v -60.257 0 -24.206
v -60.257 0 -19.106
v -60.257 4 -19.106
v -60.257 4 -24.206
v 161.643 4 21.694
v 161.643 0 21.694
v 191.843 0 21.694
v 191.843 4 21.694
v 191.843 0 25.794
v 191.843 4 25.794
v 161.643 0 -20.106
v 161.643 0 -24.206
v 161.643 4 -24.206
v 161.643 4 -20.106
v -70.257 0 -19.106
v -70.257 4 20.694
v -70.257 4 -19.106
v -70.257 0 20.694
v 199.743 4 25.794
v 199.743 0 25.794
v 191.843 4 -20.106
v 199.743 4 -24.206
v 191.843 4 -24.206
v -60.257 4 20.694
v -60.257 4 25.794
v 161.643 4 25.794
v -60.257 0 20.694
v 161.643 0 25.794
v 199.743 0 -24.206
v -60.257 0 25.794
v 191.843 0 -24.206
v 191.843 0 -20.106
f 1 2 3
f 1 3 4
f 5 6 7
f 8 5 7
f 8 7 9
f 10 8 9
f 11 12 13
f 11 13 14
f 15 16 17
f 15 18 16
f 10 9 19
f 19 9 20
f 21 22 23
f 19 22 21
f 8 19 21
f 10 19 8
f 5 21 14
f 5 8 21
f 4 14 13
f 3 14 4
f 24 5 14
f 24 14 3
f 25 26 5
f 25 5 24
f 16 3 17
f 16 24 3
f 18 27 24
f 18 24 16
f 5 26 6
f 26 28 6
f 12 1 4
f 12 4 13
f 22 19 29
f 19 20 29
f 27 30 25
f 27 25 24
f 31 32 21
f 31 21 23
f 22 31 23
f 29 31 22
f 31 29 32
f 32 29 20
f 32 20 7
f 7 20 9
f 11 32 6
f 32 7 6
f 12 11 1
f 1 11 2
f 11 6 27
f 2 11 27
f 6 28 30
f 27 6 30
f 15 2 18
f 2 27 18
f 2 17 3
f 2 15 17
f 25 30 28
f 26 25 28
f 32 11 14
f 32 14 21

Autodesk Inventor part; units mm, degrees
ref_plane "YZ Plane" through (0, 0, 0) normal (1, 0, 0) x (0, 1, 0)
ref_plane "XZ Plane" through (0, 0, 0) normal (0, 1, 0) x (-1, 0, 0)
ref_plane "XY Plane" through (0, 0, 0) normal (0, 0, 1) x (1, 0, 0)
sketch "스케치1" plane through (0, 0, 0) normal (0, 1, 0) x (-1, 0, 0)
  line L0 (-199.7433, 25.7945) -> (-199.7433, -24.2055)
  line L1 (-149.7433, 25.7945) -> (-149.7433, -24.2055) construction
  line L2 (-161.6433, 25.7945) -> (-161.6433, 21.6945)
  line L3 (-161.6433, 21.6945) -> (-191.8433, 21.6945)
  line L4 (-191.8433, 21.6945) -> (-191.8433, 25.7945)
  line L5 (-153.7433, 25.7945) -> (-153.7433, -24.2055) construction
  line L6 (-161.6433, -24.2055) -> (-161.6433, -20.1055)
  line L7 (-161.6433, -20.1055) -> (-191.8433, -20.1055)
  line L8 (-191.8433, -20.1055) -> (-191.8433, -24.2055)
  line L9 (60.2567, 25.7945) -> (60.2567, 20.6945)
  line L10 (60.2567, 20.6945) -> (70.2567, 20.6945)
  line L11 (70.2567, 20.6945) -> (70.2567, -19.1055)
  line L12 (70.2567, -19.1055) -> (60.2567, -19.1055)
  line L13 (60.2567, -19.1055) -> (60.2567, -24.2055)
  line L14 (60.2567, -24.2055) -> (-161.6433, -24.2055)
  line L15 (-191.8433, -24.2055) -> (-199.7433, -24.2055)
  line L16 (60.2567, 25.7945) -> (-161.6433, 25.7945)
  line L17 (-191.8433, 25.7945) -> (-199.7433, 25.7945)
  point P0 (0, 0)
  point P1 (-199.7433, 0.7945)
  point P2 (-149.7433, 0.7945)
  point P3 (-161.6433, 23.7445)
  point P4 (-161.6433, -22.1555)
  point P5 (-195.7933, -24.2055)
  dimension "d2" = 260
  dimension "d4" = 50
  dimension "d5" = 4.1
  dimension "d6" = 30.2
  dimension "d7" = 4
  dimension "d8" = 7.9
  dimension "d9" = 4.1
  dimension "d10" = 30.2
  dimension "d11" = 7.9
  dimension "d12" = 5.1
  dimension "d13" = 5.1
  dimension "d14" = 10
  dimension "d17" = 50
extrude "돌출1" add sketch "스케치1" along normal blind 4
properties part number "우측 센서 막대기"
